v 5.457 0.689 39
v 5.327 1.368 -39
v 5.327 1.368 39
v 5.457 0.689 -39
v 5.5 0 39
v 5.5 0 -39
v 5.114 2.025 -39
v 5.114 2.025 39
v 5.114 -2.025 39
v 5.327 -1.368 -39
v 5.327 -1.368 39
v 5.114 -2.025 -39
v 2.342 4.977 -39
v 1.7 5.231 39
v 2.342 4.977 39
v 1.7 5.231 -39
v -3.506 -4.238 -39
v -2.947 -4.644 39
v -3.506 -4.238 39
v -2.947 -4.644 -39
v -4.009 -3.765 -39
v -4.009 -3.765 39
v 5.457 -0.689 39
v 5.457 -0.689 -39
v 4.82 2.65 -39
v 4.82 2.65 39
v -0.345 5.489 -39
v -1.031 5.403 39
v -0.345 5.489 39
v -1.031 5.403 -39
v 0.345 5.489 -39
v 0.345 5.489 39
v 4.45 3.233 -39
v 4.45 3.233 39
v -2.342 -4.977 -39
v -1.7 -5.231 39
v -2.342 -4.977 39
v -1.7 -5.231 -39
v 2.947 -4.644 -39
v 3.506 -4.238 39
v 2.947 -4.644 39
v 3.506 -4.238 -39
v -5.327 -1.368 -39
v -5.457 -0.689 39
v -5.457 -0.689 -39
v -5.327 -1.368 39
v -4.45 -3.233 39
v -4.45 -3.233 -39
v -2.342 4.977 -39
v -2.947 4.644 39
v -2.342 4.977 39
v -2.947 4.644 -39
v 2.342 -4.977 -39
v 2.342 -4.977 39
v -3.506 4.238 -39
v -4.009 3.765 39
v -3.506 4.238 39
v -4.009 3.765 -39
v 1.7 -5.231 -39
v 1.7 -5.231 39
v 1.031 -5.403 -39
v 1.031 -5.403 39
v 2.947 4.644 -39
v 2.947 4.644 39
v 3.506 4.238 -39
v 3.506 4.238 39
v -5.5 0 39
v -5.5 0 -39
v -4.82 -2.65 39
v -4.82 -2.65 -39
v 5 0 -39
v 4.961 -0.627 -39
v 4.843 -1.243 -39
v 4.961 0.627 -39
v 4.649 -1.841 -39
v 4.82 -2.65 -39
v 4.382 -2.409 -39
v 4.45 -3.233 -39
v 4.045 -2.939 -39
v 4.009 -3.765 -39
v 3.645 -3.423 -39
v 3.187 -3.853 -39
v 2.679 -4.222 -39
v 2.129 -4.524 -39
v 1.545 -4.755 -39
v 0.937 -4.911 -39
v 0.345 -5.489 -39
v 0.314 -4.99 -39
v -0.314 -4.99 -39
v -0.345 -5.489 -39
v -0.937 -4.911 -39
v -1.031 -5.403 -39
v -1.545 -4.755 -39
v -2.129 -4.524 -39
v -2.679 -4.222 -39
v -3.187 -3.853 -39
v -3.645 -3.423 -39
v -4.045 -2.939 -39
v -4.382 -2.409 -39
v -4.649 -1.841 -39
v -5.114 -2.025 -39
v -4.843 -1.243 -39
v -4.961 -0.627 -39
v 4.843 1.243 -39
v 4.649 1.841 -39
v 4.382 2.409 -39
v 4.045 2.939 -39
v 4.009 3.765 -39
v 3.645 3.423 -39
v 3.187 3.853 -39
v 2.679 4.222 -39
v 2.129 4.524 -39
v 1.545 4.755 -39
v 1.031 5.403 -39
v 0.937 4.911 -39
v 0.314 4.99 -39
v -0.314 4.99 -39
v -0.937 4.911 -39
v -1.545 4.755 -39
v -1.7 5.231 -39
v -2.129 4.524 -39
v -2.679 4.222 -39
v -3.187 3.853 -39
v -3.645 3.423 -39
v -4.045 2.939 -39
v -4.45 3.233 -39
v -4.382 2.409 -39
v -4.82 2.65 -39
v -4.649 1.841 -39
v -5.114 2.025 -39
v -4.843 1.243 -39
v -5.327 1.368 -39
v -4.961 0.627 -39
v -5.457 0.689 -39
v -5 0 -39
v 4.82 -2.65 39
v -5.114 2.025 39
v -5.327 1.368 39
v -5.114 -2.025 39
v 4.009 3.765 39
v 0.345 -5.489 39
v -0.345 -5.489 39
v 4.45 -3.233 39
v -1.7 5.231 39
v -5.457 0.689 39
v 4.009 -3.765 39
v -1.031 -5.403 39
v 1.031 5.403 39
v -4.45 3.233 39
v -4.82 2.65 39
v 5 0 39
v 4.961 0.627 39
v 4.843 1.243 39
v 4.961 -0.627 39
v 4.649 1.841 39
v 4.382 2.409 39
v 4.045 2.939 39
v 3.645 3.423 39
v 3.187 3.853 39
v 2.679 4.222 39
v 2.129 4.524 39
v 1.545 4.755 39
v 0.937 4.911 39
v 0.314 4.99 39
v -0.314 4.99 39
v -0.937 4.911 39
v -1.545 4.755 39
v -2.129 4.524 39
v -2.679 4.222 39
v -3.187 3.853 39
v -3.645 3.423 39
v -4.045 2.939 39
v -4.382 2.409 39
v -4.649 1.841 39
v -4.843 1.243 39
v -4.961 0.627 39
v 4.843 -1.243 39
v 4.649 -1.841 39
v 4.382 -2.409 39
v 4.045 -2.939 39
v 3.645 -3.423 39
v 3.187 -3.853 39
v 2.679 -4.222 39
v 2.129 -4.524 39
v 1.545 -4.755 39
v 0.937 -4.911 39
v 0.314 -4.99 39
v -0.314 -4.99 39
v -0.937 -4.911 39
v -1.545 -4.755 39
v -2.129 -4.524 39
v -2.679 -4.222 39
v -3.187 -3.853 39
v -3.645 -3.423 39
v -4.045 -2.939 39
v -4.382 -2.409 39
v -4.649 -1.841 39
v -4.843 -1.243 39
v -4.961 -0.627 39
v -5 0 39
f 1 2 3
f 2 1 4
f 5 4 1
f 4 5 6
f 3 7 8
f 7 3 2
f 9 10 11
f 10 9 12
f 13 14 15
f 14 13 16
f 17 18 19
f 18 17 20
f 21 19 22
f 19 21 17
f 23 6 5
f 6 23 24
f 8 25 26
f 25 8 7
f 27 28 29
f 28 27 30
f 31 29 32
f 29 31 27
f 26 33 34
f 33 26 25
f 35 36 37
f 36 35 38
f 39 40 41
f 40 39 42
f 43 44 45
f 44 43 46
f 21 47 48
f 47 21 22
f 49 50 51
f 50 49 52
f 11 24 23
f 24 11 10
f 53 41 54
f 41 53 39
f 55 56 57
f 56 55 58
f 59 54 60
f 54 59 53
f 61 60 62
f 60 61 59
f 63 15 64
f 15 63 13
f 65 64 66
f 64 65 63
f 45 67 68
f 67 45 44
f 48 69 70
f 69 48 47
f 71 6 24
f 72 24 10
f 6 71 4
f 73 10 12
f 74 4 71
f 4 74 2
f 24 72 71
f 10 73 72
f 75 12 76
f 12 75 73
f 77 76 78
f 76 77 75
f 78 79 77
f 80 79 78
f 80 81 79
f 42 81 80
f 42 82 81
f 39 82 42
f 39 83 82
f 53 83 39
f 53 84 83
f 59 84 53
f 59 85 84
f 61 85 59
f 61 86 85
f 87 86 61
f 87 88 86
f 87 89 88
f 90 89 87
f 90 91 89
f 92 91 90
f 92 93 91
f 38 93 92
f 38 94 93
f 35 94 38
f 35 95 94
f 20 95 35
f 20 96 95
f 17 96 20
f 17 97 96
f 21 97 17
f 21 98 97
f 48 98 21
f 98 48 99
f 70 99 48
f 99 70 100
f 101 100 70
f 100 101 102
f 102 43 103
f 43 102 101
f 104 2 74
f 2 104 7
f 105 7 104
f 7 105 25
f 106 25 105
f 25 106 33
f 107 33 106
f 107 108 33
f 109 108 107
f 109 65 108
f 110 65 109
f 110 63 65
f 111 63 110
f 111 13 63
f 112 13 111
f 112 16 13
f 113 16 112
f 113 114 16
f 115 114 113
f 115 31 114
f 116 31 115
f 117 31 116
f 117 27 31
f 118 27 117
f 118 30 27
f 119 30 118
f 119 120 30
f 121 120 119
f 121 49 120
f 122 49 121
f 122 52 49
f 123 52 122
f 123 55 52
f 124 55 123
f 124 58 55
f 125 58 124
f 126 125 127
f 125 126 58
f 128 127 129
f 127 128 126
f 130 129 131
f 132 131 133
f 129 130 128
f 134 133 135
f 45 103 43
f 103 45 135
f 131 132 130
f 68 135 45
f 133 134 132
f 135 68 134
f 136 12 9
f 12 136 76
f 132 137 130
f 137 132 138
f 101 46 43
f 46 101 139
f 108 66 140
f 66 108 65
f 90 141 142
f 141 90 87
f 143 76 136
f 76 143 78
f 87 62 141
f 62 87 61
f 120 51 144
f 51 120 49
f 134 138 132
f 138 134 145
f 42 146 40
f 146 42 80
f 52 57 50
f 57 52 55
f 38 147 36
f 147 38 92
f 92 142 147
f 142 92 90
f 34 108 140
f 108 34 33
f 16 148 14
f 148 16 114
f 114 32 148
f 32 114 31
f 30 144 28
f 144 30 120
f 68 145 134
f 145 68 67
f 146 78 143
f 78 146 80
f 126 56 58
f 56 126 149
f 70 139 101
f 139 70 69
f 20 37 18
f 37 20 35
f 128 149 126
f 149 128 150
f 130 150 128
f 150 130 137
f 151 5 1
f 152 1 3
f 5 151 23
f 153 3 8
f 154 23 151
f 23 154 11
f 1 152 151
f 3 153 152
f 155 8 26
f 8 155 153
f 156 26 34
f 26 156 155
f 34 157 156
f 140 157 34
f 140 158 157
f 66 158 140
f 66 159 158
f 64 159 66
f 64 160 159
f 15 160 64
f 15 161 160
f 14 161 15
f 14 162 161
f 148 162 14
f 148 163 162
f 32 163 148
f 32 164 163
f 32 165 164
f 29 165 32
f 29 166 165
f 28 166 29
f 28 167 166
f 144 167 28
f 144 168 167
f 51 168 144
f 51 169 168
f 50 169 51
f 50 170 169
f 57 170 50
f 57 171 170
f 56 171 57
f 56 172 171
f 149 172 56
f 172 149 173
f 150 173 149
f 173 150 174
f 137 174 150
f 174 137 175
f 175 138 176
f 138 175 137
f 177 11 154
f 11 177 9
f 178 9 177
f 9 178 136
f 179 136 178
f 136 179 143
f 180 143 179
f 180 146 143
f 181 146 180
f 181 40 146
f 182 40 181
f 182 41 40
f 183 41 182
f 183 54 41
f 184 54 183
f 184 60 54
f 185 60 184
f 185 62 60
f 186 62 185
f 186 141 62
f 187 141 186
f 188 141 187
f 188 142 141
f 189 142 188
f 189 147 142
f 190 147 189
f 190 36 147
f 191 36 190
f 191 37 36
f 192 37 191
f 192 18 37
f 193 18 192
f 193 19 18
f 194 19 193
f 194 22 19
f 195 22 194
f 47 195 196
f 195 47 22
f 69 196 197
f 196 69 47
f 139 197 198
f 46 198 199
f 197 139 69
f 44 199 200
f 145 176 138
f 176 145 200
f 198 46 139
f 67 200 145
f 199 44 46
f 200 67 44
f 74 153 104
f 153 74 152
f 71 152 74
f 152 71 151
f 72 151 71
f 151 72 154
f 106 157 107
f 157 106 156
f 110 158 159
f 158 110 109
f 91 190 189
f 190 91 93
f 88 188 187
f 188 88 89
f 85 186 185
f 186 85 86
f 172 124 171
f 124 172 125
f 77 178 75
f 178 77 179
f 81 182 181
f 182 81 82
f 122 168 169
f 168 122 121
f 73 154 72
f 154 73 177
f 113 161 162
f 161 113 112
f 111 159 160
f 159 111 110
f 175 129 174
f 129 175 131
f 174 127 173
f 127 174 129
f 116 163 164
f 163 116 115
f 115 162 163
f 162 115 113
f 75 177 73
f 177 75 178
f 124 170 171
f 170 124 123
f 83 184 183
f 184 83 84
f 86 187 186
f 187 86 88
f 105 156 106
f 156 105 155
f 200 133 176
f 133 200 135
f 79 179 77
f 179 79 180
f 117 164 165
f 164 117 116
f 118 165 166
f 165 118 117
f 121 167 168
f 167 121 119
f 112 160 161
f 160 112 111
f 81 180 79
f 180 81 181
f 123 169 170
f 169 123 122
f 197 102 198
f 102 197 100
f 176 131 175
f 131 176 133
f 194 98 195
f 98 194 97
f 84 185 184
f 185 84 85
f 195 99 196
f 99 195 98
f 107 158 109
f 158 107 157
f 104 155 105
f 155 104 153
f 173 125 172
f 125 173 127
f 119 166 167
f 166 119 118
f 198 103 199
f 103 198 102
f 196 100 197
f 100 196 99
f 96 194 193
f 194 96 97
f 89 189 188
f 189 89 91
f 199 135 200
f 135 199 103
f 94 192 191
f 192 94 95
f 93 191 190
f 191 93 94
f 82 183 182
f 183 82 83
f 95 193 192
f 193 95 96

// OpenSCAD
$fn = 50;


difference() {
	union() {
		translate(v = [0, 0, -39.0000000000]) {
			cylinder(h = 78, r = 5.5000000000);
		}
	}
	union() {
		translate(v = [0, 0, -100.0000000000]) {
			cylinder(h = 200, r = 5.0000000000);
		}
	}
}
